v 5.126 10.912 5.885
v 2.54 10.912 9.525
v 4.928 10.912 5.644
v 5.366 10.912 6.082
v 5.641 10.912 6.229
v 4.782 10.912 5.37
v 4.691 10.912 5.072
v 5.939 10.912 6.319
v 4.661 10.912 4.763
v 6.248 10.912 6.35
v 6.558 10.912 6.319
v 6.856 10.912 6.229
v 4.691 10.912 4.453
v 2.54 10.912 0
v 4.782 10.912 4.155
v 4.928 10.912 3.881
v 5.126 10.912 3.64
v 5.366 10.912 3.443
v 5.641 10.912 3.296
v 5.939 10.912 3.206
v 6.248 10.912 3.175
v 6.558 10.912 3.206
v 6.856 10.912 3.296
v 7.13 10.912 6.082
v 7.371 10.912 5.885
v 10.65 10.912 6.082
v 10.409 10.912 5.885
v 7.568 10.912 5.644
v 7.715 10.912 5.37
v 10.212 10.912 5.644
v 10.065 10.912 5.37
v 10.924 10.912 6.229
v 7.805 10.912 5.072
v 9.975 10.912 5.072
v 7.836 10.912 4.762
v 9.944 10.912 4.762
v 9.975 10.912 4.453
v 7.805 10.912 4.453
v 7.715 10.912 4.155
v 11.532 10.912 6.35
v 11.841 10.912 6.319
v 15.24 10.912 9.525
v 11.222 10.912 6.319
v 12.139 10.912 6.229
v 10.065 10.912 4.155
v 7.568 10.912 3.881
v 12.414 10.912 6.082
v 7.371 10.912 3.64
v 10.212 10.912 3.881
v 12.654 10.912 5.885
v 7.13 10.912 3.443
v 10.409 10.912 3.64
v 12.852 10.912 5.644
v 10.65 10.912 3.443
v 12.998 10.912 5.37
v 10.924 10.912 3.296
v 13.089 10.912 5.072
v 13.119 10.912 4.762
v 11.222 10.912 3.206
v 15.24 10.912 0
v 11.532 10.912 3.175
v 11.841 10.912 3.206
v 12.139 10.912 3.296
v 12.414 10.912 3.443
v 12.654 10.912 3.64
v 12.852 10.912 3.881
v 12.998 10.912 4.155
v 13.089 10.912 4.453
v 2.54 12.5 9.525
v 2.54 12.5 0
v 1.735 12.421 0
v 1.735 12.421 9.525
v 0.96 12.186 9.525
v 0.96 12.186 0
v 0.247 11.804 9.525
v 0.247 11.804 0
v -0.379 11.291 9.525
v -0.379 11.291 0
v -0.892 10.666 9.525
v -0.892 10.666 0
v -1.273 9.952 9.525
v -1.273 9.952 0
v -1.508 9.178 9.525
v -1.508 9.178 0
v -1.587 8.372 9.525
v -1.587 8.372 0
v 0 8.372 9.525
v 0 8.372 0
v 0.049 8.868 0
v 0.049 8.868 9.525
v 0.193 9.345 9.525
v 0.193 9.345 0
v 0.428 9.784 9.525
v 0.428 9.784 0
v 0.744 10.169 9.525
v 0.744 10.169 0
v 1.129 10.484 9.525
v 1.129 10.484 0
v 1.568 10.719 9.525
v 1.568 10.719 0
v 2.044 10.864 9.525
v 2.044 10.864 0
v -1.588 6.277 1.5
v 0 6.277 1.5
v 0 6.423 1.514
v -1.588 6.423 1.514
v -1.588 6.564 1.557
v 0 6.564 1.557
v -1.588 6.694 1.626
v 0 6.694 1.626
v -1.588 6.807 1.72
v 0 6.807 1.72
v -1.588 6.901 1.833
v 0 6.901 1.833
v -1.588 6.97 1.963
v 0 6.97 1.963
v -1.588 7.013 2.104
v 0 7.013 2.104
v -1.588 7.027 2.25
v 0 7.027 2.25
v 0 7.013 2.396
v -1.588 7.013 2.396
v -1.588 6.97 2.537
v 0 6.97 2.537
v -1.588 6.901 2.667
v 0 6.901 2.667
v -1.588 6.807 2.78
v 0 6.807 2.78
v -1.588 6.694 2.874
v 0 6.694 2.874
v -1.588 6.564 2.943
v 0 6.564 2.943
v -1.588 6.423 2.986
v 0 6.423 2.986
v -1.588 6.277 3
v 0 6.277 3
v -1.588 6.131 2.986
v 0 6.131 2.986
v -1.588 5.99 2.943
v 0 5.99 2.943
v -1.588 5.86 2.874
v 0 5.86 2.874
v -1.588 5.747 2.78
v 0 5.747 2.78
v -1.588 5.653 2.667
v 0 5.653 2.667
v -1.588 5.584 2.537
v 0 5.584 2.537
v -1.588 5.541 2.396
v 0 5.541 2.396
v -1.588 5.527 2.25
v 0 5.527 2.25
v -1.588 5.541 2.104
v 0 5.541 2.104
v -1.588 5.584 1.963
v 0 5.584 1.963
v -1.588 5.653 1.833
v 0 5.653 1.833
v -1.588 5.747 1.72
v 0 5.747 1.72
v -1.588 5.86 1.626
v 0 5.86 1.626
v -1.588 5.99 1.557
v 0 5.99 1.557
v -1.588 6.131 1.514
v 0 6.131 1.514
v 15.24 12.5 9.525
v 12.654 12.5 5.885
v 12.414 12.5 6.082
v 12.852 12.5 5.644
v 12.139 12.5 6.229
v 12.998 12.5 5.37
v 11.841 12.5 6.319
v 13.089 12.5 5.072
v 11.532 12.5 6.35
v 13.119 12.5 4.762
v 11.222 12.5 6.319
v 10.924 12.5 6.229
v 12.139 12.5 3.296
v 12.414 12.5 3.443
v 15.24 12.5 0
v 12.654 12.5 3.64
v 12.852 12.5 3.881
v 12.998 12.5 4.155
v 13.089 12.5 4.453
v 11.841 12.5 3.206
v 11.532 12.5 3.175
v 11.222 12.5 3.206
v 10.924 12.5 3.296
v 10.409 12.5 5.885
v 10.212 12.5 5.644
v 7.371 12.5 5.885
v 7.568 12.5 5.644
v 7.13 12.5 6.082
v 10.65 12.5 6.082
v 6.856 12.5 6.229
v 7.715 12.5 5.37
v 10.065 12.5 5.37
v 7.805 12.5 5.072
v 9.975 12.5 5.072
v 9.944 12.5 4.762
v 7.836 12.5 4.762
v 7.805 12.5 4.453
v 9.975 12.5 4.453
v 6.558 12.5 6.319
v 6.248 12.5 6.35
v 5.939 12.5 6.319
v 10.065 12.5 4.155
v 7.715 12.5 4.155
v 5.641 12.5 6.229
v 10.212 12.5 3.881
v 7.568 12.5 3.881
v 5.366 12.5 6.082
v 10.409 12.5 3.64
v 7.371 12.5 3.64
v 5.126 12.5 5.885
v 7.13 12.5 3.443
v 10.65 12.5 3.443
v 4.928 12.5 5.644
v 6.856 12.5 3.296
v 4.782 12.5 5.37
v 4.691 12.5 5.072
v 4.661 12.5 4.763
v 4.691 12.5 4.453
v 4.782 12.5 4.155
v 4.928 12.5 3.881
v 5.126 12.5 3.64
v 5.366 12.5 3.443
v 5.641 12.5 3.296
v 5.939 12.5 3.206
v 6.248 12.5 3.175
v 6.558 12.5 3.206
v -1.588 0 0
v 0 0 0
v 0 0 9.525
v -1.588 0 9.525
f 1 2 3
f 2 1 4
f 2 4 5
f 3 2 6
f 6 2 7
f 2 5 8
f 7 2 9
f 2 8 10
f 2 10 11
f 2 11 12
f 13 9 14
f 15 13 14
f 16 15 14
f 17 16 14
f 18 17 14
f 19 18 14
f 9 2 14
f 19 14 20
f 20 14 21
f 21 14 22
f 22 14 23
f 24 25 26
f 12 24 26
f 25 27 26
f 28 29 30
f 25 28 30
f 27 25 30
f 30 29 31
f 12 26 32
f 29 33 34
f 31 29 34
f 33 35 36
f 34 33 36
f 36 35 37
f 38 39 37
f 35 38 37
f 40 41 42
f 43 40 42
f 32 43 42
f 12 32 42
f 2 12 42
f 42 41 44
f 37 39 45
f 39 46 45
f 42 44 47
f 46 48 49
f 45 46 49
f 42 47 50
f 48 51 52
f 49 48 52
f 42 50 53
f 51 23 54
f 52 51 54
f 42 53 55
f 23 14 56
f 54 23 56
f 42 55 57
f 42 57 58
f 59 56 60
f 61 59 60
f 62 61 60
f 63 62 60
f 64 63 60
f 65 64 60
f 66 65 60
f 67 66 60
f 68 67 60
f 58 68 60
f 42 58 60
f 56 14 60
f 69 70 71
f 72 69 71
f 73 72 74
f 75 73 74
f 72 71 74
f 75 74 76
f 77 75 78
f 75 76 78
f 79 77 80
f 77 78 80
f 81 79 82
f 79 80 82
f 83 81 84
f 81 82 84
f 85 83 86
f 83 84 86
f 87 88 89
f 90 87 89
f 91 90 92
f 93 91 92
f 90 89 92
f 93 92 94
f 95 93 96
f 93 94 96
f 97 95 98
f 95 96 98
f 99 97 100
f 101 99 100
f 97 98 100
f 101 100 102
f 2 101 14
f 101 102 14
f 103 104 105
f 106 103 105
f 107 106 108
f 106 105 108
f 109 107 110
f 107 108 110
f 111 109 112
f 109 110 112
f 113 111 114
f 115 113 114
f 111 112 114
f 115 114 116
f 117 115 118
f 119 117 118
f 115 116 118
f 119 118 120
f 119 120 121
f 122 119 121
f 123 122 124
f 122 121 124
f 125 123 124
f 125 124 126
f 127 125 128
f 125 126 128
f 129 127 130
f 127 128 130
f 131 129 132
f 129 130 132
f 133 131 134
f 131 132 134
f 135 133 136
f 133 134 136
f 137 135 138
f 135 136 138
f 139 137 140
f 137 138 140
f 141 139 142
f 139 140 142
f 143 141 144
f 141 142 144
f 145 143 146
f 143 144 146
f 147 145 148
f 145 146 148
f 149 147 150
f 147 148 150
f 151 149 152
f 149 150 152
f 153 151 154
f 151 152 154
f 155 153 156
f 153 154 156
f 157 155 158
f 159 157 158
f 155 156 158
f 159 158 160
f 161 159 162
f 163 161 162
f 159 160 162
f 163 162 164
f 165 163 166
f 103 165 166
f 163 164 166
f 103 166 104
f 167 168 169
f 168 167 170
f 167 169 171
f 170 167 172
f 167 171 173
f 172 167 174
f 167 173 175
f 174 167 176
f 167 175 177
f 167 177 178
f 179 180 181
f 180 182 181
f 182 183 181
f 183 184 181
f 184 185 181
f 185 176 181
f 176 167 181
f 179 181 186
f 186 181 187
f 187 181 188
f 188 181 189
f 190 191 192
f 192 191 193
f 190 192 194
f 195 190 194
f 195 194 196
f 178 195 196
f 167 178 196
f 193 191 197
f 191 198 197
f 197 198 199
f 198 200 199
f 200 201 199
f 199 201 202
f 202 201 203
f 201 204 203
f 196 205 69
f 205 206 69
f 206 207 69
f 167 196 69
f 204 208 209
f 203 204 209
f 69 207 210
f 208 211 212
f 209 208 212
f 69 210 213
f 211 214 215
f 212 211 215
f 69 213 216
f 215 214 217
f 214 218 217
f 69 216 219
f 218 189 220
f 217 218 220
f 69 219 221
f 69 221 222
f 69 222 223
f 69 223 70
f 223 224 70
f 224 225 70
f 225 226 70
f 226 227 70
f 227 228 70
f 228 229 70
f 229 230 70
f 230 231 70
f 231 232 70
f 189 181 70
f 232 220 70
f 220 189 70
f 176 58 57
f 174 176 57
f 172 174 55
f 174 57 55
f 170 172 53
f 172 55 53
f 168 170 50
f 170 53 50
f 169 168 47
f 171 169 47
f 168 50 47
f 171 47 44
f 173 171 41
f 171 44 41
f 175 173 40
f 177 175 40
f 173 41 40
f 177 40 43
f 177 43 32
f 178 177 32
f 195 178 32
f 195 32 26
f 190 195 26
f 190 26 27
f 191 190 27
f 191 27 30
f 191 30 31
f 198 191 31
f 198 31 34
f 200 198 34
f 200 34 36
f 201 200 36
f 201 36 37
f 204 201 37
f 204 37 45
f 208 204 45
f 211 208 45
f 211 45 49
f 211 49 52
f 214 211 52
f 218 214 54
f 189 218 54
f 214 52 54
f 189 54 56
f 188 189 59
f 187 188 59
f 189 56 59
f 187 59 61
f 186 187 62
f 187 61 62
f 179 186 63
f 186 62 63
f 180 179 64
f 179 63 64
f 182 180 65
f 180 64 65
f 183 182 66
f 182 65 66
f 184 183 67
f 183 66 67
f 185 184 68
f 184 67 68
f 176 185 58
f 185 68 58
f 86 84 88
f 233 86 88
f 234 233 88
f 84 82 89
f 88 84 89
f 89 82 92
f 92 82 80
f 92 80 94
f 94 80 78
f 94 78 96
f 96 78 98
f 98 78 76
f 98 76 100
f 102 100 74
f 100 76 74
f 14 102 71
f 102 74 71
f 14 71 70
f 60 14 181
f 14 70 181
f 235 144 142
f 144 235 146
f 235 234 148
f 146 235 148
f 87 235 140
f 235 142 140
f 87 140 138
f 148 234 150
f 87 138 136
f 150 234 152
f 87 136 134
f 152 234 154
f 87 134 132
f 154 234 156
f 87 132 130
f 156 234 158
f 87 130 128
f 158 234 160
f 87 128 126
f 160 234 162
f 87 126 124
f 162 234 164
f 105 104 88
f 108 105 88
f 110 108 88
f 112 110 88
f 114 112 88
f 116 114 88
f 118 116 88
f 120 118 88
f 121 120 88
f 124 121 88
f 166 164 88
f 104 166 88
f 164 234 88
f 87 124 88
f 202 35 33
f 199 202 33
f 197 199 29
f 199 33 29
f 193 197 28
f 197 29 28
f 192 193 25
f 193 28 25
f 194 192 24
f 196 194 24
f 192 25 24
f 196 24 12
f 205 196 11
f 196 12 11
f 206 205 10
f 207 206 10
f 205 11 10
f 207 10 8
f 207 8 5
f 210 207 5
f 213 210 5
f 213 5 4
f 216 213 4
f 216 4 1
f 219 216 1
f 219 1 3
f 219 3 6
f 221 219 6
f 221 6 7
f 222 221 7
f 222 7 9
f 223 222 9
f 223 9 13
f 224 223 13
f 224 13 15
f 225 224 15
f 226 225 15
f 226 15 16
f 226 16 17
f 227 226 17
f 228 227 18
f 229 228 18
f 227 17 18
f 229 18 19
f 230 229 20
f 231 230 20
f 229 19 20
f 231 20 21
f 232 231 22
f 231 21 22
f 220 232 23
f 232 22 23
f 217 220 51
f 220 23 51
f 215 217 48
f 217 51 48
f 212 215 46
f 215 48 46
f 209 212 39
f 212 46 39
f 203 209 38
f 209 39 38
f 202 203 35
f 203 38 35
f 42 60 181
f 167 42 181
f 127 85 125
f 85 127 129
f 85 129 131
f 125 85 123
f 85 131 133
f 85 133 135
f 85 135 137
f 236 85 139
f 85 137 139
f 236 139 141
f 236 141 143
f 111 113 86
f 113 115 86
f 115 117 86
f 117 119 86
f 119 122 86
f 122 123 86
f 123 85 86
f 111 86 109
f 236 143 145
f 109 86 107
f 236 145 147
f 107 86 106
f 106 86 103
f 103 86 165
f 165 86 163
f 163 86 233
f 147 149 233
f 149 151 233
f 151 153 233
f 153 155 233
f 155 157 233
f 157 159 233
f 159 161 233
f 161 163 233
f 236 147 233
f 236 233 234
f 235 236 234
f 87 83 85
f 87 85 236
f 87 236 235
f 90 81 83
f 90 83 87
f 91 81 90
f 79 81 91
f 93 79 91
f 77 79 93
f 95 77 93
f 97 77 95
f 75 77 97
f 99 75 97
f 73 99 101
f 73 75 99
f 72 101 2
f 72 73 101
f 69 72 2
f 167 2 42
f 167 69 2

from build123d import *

# Parameters (mm, degrees)
BOSS_EXTRUDE1_DEPTH = 9.525
SKETCH2_R           = 0.75
CUT_EXTRUDE1_DEPTH  = 1.5875
CUT_EXTRUDE2_DEPTH  = 2.54


with BuildPart() as part:
    # Sketch1 → Boss-Extrude1 (new body)
    with BuildSketch(Plane.XY):
        with BuildLine():
            Line((0, 0), (0, 8.3725))
            ThreePointArc((0, 8.3725), (0.743948776, 10.168551224), (2.54, 10.9125))
            Line((2.54, 10.9125), (15.24, 10.9125))
            Line((15.24, 10.9125), (15.24, 12.5))
            Line((15.24, 12.5), (2.54, 12.5))
            ThreePointArc((2.54, 12.5), (-0.378583239, 11.291083239), (-1.5875, 8.3725))
            Line((-1.5875, 8.3725), (-1.5875, 0))
            Line((-1.5875, 0), (0, 0))
        make_face()
    extrude(amount=BOSS_EXTRUDE1_DEPTH)

    # Sketch2 → Cut-Extrude1 (cut)
    with BuildSketch(Plane(origin=(0, 0, 0), x_dir=(0, 0, -1), z_dir=(1, 0, 0))):
        with Locations((-2.25, 6.277)):
            Circle(SKETCH2_R)
    extrude(amount=-CUT_EXTRUDE1_DEPTH, mode=Mode.SUBTRACT)

    # Sketch3 → Cut-Extrude2 (cut)
    with BuildSketch(Plane.XZ.offset(-10.9125)):
        with BuildLine():
            ThreePointArc((4.6609, 4.7625), (6.2484, 3.175), (7.8359, 4.7625))
            Line((7.8359, 4.7625), (4.6609, 4.7625))
        make_face()
        with BuildLine():
            Line((4.6609, 4.7625), (7.8359, 4.7625))
            ThreePointArc((7.8359, 4.7625), (6.2484, 6.35), (4.6609, 4.7625))
        make_face()
        with BuildLine():
            ThreePointArc((9.9441, 4.7625), (11.5316, 3.175), (13.1191, 4.7625))
            Line((13.1191, 4.7625), (9.9441, 4.7625))
        make_face()
        with BuildLine():
            Line((9.9441, 4.7625), (13.1191, 4.7625))
            ThreePointArc((13.1191, 4.7625), (11.5316, 6.35), (9.9441, 4.7625))
        make_face()
    extrude(amount=-CUT_EXTRUDE2_DEPTH, mode=Mode.SUBTRACT)


solid = part.part
